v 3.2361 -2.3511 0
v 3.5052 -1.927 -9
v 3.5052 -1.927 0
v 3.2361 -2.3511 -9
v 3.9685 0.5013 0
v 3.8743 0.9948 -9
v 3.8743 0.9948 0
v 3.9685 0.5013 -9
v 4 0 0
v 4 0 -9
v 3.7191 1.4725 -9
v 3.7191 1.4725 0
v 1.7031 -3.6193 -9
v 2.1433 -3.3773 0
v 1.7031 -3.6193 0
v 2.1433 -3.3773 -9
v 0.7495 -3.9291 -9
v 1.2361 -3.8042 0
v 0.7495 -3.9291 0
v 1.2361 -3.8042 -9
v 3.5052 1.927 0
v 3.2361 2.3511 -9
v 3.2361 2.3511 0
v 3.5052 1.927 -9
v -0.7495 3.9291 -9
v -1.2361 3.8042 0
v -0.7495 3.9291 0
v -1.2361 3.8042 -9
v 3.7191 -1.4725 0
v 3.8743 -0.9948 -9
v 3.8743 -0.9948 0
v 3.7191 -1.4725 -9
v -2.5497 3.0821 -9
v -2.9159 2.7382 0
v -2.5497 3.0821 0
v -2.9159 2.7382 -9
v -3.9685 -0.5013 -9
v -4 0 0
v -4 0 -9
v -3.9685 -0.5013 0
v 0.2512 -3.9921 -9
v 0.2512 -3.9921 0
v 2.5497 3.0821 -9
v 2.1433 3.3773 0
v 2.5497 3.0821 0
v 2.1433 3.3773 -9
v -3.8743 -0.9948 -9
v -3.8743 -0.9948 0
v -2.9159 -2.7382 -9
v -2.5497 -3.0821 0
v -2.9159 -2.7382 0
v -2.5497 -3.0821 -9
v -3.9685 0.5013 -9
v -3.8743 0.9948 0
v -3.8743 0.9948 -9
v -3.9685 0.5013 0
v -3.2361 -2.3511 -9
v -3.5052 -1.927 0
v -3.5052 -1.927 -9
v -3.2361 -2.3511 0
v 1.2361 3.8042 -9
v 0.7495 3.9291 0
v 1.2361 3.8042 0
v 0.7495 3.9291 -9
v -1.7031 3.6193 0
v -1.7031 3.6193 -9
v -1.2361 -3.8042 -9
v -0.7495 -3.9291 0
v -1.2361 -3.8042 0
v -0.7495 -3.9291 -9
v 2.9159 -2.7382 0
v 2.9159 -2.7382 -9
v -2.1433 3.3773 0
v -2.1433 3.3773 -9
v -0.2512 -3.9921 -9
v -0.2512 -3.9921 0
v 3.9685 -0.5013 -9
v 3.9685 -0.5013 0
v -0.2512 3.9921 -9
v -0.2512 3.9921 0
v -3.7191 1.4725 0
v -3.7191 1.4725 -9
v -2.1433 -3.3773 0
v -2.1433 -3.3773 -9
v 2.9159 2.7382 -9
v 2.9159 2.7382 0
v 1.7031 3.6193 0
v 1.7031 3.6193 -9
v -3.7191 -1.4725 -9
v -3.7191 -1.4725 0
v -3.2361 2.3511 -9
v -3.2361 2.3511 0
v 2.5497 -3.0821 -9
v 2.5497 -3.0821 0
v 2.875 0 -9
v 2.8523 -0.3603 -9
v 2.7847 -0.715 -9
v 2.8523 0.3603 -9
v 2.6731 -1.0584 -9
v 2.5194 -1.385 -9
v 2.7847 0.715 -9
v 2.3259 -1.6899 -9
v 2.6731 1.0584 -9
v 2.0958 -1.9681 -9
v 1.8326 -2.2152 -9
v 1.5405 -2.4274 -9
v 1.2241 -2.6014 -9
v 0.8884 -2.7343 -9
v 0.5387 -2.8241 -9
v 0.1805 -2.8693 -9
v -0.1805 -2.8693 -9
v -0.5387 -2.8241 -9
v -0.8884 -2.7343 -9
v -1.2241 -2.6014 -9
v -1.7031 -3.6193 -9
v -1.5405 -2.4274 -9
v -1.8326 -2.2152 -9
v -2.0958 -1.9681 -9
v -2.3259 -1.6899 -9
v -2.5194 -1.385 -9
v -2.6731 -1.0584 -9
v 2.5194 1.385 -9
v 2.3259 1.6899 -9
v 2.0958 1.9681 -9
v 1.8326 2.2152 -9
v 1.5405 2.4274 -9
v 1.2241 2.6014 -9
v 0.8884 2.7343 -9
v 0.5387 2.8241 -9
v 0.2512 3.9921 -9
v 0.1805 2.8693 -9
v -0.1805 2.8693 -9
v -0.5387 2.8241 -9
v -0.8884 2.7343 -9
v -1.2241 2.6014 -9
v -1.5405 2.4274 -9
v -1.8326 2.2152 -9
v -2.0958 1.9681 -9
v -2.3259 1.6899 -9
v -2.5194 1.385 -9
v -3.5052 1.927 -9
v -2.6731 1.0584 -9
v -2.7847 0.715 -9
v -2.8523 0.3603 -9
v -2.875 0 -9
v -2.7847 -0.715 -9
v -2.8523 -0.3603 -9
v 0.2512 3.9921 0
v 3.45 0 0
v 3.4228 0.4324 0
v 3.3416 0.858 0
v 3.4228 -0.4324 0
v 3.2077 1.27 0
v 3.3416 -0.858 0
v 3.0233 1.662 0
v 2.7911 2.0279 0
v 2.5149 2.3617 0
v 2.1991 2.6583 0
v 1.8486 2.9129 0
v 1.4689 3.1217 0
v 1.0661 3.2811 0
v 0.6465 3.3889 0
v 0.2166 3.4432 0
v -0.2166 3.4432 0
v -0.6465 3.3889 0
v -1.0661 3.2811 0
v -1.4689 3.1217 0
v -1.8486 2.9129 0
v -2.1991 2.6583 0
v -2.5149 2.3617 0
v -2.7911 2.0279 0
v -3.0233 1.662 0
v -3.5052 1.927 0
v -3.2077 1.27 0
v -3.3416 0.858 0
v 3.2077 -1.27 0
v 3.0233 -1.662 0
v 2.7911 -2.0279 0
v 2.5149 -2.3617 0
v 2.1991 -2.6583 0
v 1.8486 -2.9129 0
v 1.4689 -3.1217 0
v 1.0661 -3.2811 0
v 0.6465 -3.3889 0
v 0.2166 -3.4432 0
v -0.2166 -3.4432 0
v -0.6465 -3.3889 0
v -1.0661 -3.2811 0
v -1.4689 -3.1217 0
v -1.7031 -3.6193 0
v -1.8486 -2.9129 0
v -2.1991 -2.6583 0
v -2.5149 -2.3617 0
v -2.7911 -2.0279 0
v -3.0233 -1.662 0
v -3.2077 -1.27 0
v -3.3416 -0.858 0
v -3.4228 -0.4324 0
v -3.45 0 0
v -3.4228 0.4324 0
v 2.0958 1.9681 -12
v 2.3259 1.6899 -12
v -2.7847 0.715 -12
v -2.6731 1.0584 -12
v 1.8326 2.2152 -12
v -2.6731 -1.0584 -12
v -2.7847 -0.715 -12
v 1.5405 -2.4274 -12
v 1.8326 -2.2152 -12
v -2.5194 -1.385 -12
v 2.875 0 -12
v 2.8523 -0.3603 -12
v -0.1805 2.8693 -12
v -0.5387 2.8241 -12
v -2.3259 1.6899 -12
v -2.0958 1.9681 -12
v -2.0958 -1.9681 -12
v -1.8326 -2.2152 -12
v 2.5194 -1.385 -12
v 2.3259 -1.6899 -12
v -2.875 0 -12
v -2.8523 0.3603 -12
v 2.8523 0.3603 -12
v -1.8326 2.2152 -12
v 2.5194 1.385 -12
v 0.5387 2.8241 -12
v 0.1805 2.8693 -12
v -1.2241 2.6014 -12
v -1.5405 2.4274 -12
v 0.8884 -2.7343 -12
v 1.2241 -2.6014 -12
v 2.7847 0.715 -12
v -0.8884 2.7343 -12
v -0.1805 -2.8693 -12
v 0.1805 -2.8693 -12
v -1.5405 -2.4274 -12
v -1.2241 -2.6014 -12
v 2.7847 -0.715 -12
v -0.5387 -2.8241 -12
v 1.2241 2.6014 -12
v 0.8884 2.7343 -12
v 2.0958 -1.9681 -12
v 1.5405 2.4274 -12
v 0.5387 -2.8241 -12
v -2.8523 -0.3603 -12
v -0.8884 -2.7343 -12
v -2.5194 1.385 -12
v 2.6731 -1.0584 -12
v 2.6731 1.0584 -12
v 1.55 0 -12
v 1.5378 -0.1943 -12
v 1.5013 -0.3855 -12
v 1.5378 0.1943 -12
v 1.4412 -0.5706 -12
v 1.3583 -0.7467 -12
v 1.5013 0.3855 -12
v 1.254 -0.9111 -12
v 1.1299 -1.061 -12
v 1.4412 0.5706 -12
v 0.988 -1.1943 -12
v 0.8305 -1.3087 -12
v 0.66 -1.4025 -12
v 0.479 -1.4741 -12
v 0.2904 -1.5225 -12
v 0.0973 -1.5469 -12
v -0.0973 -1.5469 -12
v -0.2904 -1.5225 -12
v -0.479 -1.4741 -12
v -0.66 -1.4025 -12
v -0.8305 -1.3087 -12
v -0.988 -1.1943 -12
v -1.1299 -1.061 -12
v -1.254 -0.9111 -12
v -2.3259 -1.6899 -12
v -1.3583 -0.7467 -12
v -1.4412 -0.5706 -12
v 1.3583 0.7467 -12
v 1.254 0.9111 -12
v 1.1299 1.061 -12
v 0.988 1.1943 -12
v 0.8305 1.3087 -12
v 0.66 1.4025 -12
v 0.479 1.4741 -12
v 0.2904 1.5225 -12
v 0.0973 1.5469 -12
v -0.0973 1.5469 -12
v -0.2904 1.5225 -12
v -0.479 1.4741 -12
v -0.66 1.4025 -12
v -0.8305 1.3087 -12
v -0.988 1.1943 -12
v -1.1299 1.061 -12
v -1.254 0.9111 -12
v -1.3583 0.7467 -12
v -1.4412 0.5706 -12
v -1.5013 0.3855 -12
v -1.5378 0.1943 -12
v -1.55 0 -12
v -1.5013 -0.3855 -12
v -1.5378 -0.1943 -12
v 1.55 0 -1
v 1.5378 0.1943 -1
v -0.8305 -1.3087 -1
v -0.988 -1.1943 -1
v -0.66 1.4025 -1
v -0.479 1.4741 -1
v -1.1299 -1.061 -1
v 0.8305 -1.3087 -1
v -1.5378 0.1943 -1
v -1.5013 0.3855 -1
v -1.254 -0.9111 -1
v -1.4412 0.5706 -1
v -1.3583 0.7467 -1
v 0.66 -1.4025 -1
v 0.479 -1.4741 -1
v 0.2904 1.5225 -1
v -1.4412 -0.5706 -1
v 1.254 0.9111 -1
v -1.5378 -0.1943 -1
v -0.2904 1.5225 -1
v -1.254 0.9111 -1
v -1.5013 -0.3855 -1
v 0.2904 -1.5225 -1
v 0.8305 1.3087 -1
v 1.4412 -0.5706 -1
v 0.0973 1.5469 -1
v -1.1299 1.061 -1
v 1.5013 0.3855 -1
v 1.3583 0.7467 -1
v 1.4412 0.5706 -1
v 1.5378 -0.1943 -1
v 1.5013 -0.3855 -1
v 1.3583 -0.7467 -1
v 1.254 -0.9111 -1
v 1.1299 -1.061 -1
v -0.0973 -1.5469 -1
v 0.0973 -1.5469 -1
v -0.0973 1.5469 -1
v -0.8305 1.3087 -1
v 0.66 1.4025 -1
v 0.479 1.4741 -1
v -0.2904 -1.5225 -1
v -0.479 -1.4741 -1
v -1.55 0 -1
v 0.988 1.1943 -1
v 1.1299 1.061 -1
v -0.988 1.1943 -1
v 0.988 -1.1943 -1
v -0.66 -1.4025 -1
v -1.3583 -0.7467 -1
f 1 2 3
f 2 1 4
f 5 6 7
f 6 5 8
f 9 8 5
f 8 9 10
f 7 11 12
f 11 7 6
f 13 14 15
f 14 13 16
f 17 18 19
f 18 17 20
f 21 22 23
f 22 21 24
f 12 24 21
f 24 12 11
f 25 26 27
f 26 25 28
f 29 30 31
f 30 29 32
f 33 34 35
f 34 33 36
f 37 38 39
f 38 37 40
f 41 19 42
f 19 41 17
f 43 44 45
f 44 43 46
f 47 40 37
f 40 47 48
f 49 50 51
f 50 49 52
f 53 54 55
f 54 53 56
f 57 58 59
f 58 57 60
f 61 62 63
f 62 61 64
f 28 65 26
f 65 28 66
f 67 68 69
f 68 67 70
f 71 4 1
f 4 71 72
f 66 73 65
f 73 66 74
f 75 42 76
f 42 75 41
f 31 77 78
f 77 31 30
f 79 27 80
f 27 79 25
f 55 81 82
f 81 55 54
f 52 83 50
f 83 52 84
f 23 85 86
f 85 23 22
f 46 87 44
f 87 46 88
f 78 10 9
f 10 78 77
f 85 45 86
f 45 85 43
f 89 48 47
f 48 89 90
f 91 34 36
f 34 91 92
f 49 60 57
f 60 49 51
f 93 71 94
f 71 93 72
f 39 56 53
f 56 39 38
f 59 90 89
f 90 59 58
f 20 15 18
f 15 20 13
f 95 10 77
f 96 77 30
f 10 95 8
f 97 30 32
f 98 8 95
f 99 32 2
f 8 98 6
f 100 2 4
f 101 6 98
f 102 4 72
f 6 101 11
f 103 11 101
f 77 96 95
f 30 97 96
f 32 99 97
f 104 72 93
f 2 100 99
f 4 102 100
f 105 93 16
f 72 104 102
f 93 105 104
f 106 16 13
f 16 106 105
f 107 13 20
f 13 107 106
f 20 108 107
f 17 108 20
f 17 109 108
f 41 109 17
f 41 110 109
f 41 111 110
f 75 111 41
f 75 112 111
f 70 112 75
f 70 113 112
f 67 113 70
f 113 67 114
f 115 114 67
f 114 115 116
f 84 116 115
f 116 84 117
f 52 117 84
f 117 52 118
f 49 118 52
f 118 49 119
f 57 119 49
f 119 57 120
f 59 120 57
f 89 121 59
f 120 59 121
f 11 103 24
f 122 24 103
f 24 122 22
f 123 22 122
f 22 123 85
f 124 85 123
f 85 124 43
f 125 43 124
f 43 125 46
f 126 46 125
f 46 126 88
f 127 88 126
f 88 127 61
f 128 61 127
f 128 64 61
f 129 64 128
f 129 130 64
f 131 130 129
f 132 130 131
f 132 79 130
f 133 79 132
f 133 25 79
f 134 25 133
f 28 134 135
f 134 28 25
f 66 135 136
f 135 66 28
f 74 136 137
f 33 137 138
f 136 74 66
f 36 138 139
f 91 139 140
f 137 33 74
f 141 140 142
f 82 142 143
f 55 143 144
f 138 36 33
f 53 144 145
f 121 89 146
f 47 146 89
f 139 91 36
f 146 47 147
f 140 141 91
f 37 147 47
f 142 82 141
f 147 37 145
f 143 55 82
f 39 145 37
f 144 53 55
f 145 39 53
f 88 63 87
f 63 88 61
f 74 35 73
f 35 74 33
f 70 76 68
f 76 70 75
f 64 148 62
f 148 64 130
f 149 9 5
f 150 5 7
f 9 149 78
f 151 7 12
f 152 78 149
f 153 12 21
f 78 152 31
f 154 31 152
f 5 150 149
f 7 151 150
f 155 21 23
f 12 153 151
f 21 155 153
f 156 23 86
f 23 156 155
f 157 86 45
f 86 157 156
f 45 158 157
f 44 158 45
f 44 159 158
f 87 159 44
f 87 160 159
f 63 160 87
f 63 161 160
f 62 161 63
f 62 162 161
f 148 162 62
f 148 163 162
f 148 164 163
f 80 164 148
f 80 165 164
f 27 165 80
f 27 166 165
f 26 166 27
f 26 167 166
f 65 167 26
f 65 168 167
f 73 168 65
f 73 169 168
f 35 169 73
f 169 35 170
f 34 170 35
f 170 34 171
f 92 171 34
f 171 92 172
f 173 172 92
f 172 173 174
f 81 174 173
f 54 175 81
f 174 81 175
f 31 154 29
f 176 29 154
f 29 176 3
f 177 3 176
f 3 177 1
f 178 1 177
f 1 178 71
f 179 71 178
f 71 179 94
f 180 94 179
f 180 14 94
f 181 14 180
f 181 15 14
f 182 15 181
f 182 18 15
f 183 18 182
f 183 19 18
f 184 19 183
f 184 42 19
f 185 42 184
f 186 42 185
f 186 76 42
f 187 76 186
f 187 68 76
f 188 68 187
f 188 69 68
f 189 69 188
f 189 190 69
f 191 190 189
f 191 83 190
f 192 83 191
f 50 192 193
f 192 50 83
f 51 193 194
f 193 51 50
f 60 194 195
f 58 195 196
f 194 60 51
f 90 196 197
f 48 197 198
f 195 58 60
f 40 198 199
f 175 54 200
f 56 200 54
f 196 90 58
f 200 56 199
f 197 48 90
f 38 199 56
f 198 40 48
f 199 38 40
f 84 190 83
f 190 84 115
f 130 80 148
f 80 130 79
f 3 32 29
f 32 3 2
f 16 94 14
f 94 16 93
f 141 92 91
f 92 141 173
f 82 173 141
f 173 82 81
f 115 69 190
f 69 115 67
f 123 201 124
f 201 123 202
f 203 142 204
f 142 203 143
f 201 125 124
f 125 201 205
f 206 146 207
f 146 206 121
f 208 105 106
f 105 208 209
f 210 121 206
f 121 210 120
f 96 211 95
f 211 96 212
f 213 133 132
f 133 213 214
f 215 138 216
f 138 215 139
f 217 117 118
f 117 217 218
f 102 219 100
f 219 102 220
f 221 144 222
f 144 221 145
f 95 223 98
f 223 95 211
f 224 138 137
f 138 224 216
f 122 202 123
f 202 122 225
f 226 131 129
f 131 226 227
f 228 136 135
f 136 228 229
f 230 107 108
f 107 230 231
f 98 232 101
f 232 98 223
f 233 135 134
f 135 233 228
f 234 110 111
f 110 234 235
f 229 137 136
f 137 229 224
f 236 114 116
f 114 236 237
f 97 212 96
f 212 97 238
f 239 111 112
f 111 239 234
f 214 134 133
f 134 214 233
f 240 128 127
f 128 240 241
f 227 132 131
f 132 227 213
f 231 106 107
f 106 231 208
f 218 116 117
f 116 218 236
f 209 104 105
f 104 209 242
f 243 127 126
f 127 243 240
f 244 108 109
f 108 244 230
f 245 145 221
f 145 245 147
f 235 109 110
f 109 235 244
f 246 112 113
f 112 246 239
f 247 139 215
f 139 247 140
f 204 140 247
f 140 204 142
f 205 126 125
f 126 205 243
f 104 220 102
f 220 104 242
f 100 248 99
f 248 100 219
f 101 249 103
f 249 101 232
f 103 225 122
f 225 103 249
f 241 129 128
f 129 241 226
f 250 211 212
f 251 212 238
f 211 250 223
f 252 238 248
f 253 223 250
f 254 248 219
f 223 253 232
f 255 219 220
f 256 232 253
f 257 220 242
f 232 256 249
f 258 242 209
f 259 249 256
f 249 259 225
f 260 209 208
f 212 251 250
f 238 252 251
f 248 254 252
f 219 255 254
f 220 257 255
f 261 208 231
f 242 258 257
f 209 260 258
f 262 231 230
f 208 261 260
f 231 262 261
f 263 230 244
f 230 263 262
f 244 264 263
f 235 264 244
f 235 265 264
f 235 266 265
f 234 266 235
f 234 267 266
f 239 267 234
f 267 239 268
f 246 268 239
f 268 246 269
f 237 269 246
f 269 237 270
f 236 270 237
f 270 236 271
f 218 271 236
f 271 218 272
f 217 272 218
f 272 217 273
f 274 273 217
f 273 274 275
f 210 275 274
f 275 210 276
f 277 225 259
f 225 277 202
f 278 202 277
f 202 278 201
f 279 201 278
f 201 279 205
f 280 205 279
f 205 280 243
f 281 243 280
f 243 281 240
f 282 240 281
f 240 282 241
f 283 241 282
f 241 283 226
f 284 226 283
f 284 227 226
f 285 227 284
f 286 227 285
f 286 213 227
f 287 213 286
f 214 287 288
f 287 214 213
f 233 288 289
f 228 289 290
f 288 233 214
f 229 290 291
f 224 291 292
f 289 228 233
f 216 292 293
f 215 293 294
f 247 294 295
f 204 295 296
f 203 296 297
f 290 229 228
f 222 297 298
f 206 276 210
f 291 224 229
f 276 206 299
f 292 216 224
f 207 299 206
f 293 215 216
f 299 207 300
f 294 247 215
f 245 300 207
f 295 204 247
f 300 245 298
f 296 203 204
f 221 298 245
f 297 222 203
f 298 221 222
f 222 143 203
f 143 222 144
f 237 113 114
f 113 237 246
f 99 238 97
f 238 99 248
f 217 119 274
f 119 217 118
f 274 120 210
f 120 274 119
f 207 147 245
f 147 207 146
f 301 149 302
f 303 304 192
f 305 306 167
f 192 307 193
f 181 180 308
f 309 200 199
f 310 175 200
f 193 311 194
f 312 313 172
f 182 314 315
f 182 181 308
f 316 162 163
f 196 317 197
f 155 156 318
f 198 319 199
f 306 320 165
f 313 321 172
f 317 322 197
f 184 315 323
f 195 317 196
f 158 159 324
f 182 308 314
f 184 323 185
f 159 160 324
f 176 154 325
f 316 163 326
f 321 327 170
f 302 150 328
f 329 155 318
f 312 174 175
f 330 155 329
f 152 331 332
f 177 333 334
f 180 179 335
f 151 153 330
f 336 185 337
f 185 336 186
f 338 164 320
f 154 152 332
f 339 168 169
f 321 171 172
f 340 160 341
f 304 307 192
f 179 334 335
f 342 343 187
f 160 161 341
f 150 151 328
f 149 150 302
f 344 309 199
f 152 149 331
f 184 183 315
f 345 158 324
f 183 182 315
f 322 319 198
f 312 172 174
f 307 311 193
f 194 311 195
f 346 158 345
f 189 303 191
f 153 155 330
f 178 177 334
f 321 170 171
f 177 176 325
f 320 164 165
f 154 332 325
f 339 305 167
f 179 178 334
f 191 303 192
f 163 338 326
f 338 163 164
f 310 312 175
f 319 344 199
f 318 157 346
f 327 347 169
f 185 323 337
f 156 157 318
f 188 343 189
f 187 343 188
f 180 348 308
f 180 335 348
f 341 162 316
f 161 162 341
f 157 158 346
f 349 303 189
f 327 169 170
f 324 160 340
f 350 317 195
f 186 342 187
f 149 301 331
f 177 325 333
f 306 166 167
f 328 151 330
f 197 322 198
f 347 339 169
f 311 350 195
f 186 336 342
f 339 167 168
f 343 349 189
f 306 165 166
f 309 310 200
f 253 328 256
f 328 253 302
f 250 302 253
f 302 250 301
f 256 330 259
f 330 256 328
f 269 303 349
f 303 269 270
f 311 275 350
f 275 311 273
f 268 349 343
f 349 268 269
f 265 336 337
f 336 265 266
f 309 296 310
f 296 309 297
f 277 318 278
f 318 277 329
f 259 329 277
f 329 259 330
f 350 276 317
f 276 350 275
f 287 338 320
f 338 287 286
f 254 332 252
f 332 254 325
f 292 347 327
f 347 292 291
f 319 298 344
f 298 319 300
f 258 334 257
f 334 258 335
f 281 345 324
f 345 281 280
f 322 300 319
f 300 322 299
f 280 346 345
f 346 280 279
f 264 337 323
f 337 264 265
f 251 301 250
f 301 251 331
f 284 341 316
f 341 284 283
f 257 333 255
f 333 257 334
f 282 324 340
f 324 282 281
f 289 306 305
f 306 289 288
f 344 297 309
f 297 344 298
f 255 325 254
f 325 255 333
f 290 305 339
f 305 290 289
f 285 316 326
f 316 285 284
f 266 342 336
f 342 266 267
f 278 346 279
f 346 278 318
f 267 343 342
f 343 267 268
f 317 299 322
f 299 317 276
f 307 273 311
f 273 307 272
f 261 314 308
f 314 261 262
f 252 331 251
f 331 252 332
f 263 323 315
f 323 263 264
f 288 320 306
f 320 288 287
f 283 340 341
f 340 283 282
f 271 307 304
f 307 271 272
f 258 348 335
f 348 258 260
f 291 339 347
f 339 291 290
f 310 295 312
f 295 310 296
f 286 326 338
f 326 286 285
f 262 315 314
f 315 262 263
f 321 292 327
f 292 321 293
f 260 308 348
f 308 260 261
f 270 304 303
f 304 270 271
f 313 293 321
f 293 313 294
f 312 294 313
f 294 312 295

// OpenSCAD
$fn = 50;

difference() {
	union() {
		translate(v = [0, 0, -9.0]) {
			cylinder(h = 9, r = 4.0);
		}
		#translate(v = [0, 0, -12.0]) {
			cylinder(h = 12, r = 2.875);
		}
	}
	union() {
		translate(v = [0, 0, 0]) {
			rotate(a = [0, 0, 0]) {
				difference() {
					union() {
						translate(v = [0, 0, -12.0]) {
							cylinder(h = 12, r = 1.25);
						}
						translate(v = [0, 0, -1.0]) {
							cylinder(h = 1.0, r1 = 1.55, r2 = 3.45);
						}
						translate(v = [0, 0, -12.0]) {
							cylinder(h = 12, r = 1.55);
						}
						translate(v = [0, 0, -12.0]) {
							cylinder(h = 12, r = 1.25);
						}
					}
					union();
				}
			}
		}
	}
}
